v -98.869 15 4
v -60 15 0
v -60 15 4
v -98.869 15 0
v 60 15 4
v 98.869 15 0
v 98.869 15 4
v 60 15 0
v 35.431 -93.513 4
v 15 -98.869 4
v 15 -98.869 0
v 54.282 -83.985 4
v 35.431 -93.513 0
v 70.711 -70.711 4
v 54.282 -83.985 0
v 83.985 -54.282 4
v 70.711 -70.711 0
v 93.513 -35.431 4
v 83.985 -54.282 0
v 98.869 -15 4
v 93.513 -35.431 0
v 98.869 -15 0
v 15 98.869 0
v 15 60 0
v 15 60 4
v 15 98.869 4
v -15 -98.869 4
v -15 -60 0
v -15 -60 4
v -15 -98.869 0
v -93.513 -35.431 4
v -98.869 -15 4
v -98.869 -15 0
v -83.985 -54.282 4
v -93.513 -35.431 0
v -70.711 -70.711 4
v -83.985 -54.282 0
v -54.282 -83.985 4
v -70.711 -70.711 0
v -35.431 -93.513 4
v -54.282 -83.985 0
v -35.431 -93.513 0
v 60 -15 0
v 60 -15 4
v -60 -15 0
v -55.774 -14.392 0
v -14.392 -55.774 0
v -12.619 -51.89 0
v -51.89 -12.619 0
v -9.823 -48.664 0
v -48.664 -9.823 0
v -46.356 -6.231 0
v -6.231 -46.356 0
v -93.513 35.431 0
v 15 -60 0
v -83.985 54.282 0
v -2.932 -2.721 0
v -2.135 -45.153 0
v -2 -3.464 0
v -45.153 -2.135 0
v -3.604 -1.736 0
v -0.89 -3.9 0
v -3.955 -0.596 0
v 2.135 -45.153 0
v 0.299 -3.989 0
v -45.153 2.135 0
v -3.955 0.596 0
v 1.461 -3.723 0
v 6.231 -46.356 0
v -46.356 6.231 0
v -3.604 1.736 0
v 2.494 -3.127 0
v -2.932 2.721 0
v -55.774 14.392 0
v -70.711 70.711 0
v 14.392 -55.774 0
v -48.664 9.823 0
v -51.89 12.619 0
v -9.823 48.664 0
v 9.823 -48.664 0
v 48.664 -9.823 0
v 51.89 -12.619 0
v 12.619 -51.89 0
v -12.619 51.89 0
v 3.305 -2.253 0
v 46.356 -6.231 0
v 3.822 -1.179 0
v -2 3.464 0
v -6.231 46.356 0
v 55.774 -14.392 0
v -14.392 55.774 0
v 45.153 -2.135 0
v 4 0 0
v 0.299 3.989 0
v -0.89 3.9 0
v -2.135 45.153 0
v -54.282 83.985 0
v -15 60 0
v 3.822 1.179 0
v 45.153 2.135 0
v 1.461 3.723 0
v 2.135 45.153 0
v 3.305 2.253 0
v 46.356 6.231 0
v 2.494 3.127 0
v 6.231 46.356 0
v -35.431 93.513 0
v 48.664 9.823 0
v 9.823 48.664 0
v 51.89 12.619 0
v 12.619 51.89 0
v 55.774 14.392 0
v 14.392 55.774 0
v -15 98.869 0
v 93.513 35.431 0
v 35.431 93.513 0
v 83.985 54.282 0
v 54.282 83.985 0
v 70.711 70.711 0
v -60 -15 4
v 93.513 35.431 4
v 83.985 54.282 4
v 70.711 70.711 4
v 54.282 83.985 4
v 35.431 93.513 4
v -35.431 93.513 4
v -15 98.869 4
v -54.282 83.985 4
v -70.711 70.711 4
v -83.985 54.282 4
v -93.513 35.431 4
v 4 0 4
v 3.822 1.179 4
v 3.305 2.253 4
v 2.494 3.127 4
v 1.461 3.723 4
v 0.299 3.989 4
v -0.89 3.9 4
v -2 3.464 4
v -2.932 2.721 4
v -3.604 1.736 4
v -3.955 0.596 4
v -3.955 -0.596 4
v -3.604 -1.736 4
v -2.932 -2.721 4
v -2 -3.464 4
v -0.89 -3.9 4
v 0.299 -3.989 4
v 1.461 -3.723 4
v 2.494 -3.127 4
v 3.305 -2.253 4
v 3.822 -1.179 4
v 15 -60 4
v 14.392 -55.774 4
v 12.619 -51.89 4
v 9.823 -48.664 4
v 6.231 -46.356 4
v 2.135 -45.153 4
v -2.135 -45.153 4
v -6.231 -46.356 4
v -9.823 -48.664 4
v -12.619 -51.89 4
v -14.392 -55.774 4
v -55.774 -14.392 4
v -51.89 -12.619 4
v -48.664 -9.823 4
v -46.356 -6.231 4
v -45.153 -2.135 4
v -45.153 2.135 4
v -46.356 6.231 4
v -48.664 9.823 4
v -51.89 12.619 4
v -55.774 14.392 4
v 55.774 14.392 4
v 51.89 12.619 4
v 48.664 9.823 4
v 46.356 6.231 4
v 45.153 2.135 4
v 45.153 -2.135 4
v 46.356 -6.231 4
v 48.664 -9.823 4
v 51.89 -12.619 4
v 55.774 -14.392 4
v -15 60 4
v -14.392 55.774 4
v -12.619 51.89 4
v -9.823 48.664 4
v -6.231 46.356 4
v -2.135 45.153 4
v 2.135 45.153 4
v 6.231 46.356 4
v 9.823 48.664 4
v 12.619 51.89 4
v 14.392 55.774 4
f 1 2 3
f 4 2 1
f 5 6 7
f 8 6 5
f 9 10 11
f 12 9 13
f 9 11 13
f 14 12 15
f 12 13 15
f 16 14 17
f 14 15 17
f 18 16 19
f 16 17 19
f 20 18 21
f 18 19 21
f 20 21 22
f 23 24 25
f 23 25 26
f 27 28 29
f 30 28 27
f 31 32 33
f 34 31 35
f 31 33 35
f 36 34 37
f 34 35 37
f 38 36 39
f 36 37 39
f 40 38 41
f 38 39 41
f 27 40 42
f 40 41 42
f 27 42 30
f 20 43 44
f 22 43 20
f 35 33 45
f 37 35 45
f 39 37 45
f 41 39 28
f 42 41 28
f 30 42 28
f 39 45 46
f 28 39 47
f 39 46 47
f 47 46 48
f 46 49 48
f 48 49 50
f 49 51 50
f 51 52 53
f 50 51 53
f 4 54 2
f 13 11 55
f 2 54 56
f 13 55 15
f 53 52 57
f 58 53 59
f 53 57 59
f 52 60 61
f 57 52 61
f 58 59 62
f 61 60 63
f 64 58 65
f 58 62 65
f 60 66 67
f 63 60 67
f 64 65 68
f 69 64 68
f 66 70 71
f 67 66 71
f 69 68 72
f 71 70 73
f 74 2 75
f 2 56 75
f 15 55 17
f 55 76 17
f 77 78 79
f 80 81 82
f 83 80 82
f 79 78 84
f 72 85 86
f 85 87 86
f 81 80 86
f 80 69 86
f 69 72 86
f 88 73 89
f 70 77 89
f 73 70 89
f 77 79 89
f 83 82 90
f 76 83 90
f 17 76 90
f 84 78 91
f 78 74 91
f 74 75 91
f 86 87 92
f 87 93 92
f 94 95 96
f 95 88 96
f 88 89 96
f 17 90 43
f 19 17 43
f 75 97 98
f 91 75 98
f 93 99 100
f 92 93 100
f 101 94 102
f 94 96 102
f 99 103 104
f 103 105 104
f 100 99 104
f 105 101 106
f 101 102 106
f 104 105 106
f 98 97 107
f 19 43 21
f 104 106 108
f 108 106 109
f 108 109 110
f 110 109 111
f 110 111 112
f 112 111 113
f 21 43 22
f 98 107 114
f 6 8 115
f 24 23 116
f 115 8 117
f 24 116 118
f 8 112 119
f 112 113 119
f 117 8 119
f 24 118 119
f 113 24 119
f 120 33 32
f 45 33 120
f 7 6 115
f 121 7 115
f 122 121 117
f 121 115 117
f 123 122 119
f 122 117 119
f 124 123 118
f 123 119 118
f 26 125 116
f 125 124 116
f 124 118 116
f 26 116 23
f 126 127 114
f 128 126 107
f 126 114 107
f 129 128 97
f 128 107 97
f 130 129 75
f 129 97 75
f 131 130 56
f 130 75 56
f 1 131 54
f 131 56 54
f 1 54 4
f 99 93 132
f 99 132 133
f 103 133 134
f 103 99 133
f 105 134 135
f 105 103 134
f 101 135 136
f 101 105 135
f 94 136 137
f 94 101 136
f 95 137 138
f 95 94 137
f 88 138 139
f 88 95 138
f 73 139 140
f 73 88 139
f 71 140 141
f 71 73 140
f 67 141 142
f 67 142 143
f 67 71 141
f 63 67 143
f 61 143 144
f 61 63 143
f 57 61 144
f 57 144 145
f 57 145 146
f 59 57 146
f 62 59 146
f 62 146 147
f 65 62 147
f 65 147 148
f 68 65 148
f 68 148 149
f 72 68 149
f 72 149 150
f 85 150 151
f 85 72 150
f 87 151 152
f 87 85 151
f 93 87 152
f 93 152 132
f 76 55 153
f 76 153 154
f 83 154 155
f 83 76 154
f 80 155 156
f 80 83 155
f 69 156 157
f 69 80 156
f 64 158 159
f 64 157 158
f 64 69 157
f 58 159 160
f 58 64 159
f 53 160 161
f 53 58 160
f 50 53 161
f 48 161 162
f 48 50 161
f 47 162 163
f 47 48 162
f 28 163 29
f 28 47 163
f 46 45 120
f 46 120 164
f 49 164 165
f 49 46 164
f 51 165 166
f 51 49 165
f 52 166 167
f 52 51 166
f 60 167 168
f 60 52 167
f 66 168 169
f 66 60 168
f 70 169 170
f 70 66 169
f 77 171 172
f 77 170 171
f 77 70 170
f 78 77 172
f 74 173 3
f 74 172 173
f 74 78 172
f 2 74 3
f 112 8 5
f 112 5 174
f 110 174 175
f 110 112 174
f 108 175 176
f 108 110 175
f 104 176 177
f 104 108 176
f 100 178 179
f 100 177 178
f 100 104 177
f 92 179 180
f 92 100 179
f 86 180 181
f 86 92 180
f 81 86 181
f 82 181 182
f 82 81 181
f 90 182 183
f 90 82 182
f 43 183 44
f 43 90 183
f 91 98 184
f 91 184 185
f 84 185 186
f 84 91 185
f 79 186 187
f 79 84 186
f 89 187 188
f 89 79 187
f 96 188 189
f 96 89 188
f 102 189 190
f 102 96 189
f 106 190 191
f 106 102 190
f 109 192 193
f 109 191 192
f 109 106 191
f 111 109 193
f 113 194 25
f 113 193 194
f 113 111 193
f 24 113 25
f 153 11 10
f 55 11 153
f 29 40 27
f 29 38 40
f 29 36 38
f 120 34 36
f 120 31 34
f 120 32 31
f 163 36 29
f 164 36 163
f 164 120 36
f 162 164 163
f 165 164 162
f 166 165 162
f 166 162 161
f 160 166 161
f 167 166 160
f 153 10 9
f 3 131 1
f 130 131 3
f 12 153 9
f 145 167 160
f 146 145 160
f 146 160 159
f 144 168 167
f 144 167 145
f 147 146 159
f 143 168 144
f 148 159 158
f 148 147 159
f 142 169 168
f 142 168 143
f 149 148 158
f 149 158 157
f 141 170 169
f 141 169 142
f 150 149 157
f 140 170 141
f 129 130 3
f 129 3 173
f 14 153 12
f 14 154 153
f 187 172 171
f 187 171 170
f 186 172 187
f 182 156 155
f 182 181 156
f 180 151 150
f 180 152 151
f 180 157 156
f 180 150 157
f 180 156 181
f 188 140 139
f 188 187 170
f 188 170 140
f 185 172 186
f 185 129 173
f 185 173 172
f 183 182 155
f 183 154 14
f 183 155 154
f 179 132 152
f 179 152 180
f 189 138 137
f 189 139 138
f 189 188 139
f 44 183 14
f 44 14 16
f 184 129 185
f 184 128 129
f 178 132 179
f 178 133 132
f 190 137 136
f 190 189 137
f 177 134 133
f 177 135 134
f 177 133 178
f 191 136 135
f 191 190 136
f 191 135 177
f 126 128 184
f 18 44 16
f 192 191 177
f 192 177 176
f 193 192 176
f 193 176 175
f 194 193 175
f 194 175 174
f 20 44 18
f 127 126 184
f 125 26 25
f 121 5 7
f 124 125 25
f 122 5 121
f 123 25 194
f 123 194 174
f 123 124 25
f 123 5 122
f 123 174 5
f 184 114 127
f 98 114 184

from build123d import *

# Parameters (mm, degrees)
SKETCH1_R           = 100
SKETCH1_R_2         = 4
BOSS_EXTRUDE1_DEPTH = 4
CUT_EXTRUDE2_START  = -4
CUT_EXTRUDE2_DEPTH  = 5
CIRPATTERN14_COUNT  = 4


with BuildPart() as part:
    # Sketch1 → Boss-Extrude1 (new body)
    with BuildSketch(Plane.XY):
        Circle(SKETCH1_R)
        Circle(SKETCH1_R_2, mode=Mode.SUBTRACT)
    extrude(amount=BOSS_EXTRUDE1_DEPTH)

    # Sketch2 → Cut-Extrude2 (cut)
    with BuildSketch(Plane.XY.offset(4).offset(CUT_EXTRUDE2_START)):
        with BuildLine():
            Line((-15, 682.376448842), (-15, 134.079674161))
            Line((-15, 134.079674161), (-15, 60))
            ThreePointArc((-15, 60), (0, 45), (15, 60))
            Line((15, 60), (15, 143.343079639))
            Line((15, 143.343079639), (15, 691.63985432))
            Line((15, 691.63985432), (-308.533757453, 1739.42004133))
            Line((-308.533757453, 1739.42004133), (-338.533757453, 1730.156635852))
            Line((-338.533757453, 1730.156635852), (-15, 682.376448842))
        make_face()
    cut_extrude2 = extrude(amount=CUT_EXTRUDE2_DEPTH, mode=Mode.SUBTRACT)

    # CirPattern14: Cut-Extrude2 ×4 about axis
    cirpattern14_axis = Axis((0, 0, 0), (0, 0, 1))
    for i in range(1, CIRPATTERN14_COUNT):
        add(cut_extrude2.rotate(cirpattern14_axis, i * 360 / CIRPATTERN14_COUNT), mode=Mode.SUBTRACT)


solid = part.part
